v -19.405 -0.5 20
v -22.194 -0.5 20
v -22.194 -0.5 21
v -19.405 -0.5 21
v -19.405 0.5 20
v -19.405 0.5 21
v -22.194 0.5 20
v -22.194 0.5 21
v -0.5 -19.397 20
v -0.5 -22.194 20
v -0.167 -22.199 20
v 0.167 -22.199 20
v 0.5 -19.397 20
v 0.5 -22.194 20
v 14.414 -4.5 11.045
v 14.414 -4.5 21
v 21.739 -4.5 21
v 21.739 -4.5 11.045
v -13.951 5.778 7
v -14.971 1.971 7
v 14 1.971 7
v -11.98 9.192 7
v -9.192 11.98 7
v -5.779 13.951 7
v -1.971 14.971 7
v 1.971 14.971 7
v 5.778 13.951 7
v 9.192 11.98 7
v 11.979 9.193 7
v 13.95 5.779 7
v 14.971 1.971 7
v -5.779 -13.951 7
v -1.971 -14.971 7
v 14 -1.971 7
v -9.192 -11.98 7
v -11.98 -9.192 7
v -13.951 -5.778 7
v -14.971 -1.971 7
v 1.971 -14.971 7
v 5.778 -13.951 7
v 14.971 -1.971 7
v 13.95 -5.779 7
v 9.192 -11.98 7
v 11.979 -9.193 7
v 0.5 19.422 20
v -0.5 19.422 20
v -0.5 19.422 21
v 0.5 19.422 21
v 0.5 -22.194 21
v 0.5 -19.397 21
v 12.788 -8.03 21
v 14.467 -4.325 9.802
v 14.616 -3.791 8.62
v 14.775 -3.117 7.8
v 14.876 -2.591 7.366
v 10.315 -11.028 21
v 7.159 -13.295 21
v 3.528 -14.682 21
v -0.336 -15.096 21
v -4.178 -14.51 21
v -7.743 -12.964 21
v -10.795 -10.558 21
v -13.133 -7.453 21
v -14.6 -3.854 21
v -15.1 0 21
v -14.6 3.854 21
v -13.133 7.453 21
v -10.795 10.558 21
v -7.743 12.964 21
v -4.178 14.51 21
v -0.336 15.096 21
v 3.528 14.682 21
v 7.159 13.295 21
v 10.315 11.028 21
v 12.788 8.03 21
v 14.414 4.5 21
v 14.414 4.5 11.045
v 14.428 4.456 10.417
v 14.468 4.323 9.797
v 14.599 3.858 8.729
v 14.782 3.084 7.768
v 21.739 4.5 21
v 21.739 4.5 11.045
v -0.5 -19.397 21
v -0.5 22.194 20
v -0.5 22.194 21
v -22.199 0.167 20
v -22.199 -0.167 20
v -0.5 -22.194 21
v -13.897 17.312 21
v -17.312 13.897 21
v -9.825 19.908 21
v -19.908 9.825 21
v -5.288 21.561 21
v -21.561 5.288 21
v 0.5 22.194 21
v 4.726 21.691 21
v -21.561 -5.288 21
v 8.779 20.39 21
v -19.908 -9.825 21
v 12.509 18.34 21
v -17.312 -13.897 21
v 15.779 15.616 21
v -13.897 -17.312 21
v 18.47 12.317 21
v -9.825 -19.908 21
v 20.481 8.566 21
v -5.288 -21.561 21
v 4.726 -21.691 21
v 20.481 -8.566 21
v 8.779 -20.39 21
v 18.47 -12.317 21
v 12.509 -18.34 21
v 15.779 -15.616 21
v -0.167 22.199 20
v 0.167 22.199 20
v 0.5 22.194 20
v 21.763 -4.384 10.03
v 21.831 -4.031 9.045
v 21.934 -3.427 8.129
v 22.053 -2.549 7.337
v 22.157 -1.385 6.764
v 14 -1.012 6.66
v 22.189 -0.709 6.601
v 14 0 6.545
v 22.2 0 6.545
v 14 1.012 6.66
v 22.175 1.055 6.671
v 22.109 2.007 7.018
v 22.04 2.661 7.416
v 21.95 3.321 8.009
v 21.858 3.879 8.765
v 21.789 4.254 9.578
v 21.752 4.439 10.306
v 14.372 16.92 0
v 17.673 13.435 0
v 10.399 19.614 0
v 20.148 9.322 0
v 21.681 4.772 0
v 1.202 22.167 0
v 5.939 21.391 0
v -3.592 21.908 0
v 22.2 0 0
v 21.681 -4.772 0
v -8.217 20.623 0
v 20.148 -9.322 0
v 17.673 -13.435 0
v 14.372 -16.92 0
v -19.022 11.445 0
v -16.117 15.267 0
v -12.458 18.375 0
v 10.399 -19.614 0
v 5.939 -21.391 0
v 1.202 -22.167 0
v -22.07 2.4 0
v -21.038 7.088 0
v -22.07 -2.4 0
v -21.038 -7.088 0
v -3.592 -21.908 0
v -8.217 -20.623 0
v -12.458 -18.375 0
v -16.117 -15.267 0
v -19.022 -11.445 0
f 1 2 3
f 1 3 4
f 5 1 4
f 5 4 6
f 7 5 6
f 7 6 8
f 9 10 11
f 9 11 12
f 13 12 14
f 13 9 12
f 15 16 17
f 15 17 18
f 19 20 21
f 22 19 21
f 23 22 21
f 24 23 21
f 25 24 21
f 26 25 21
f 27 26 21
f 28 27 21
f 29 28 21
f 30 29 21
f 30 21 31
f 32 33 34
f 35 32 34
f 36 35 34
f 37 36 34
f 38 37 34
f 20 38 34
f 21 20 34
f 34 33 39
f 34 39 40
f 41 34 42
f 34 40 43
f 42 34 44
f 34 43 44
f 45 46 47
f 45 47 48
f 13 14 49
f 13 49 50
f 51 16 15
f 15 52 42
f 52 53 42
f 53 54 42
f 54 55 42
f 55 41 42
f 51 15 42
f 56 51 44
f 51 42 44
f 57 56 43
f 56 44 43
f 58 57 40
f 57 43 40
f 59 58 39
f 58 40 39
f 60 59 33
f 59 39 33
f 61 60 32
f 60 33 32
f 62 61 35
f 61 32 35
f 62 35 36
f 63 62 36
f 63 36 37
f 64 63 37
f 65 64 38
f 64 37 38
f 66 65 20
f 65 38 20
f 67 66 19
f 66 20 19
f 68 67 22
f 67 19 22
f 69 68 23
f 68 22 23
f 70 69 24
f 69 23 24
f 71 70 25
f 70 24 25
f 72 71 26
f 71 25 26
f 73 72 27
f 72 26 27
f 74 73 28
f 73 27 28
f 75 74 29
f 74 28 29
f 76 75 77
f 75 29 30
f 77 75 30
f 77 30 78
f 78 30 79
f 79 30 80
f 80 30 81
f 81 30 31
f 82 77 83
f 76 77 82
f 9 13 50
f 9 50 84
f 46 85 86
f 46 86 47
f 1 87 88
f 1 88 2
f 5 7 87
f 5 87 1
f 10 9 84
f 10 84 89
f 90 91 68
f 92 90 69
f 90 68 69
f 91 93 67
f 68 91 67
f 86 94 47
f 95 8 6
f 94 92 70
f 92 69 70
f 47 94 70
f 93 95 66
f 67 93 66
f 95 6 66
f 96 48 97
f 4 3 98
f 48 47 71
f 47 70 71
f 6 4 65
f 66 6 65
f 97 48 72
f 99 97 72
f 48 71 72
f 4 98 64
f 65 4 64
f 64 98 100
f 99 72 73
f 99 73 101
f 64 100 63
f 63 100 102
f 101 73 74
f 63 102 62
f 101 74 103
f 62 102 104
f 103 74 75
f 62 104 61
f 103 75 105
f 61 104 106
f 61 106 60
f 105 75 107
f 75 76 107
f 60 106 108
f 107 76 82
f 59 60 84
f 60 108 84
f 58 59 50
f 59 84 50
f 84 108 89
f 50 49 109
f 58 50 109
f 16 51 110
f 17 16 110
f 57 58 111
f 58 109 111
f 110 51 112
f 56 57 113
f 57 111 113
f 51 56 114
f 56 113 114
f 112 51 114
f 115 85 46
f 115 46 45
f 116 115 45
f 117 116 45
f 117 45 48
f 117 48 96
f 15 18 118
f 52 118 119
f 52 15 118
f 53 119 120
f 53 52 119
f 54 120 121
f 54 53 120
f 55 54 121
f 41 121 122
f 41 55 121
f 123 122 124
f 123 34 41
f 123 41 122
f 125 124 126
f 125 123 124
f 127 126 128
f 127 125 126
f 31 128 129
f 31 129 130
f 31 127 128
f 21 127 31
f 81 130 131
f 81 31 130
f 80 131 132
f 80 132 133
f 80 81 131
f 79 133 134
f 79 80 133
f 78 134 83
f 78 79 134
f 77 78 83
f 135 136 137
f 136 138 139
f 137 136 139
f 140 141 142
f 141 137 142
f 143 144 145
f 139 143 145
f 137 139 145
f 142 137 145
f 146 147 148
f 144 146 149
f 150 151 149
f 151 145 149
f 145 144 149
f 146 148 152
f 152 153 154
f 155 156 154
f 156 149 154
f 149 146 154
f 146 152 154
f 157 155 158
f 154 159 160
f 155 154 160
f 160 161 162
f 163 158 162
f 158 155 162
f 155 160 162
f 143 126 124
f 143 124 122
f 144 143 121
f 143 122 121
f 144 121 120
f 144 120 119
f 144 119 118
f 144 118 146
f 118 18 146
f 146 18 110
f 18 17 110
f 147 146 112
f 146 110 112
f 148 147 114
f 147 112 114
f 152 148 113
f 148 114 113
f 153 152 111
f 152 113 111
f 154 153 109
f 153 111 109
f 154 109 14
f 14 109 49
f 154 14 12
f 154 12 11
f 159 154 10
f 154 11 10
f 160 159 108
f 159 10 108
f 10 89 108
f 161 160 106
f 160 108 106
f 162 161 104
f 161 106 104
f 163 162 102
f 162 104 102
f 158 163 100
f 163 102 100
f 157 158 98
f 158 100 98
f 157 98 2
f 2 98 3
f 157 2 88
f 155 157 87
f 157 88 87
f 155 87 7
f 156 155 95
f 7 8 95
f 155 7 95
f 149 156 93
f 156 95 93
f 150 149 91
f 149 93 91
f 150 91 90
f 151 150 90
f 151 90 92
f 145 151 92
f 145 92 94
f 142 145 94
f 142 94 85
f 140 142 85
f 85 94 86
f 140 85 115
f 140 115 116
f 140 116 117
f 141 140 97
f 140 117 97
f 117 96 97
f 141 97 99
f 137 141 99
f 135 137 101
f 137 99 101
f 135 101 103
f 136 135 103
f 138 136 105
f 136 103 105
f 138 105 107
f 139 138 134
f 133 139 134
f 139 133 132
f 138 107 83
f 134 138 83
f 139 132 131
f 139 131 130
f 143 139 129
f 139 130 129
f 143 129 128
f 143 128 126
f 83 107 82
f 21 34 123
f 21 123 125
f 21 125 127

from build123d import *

# Parameters (mm, degrees)
F4_START = 14
F4_DEPTH = 16
F5_START = 20
F5_DEPTH = 1


with BuildPart() as f3:
    # F0 (on Front) → F3 (revolve)
    with BuildSketch(Plane.XZ):
        Polygon((0, 7), (0, 0), (22.2, 0), (22.2, 21), (15.1, 21), (15.1, 7), align=None)
    revolve(axis=Axis((0, 0, 3.5), (0, 0, -1)))

    # F1 (on Right) → F4 (cut)
    with BuildSketch(Plane.YZ.offset(F4_START)):
        with BuildLine():
            Line((4.5, 21.0452601314), (0, 21.0452601314))
            Line((0, 21.0452601314), (-4.5, 21.0452601314))
            Line((-4.5, 21.0452601314), (-4.5, 11.0452601314))
            ThreePointArc((-4.5, 11.0452601314), (0, 6.5452601314), (4.5, 11.0452601314))
            Line((4.5, 11.0452601314), (4.5, 21.0452601314))
        make_face()
    extrude(amount=F4_DEPTH, mode=Mode.SUBTRACT)

    # F2 (on Top) → F5 (cut)
    with BuildSketch(Plane.XY.offset(F5_START)):
        Polygon((0.5, -19.3967004567), (0, -19.3967004567), (-0.5, -19.3967004567), (-0.5, -22.3967004567), (0.5, -22.3967004567), align=None)
        Polygon((0.4999070801, 22.4221755646), (-9.29199e-05, 22.4221755646), (-0.5000929199, 22.4221755646), (-0.5000929199, 19.4221755646), (0.4999070801, 19.4221755646), align=None)
        Polygon((22.3929286003, -0.5), (22.3929286003, 0), (22.3929286003, 0.5), (19.3929286003, 0.5), (19.3929286003, -0.5), align=None)
        Polygon((-19.404573366, -0.5), (-19.404573366, 0), (-19.404573366, 0.5), (-22.404573366, 0.5), (-22.404573366, -0.5), align=None)
    extrude(amount=F5_DEPTH, mode=Mode.SUBTRACT)


solid = f3.part
